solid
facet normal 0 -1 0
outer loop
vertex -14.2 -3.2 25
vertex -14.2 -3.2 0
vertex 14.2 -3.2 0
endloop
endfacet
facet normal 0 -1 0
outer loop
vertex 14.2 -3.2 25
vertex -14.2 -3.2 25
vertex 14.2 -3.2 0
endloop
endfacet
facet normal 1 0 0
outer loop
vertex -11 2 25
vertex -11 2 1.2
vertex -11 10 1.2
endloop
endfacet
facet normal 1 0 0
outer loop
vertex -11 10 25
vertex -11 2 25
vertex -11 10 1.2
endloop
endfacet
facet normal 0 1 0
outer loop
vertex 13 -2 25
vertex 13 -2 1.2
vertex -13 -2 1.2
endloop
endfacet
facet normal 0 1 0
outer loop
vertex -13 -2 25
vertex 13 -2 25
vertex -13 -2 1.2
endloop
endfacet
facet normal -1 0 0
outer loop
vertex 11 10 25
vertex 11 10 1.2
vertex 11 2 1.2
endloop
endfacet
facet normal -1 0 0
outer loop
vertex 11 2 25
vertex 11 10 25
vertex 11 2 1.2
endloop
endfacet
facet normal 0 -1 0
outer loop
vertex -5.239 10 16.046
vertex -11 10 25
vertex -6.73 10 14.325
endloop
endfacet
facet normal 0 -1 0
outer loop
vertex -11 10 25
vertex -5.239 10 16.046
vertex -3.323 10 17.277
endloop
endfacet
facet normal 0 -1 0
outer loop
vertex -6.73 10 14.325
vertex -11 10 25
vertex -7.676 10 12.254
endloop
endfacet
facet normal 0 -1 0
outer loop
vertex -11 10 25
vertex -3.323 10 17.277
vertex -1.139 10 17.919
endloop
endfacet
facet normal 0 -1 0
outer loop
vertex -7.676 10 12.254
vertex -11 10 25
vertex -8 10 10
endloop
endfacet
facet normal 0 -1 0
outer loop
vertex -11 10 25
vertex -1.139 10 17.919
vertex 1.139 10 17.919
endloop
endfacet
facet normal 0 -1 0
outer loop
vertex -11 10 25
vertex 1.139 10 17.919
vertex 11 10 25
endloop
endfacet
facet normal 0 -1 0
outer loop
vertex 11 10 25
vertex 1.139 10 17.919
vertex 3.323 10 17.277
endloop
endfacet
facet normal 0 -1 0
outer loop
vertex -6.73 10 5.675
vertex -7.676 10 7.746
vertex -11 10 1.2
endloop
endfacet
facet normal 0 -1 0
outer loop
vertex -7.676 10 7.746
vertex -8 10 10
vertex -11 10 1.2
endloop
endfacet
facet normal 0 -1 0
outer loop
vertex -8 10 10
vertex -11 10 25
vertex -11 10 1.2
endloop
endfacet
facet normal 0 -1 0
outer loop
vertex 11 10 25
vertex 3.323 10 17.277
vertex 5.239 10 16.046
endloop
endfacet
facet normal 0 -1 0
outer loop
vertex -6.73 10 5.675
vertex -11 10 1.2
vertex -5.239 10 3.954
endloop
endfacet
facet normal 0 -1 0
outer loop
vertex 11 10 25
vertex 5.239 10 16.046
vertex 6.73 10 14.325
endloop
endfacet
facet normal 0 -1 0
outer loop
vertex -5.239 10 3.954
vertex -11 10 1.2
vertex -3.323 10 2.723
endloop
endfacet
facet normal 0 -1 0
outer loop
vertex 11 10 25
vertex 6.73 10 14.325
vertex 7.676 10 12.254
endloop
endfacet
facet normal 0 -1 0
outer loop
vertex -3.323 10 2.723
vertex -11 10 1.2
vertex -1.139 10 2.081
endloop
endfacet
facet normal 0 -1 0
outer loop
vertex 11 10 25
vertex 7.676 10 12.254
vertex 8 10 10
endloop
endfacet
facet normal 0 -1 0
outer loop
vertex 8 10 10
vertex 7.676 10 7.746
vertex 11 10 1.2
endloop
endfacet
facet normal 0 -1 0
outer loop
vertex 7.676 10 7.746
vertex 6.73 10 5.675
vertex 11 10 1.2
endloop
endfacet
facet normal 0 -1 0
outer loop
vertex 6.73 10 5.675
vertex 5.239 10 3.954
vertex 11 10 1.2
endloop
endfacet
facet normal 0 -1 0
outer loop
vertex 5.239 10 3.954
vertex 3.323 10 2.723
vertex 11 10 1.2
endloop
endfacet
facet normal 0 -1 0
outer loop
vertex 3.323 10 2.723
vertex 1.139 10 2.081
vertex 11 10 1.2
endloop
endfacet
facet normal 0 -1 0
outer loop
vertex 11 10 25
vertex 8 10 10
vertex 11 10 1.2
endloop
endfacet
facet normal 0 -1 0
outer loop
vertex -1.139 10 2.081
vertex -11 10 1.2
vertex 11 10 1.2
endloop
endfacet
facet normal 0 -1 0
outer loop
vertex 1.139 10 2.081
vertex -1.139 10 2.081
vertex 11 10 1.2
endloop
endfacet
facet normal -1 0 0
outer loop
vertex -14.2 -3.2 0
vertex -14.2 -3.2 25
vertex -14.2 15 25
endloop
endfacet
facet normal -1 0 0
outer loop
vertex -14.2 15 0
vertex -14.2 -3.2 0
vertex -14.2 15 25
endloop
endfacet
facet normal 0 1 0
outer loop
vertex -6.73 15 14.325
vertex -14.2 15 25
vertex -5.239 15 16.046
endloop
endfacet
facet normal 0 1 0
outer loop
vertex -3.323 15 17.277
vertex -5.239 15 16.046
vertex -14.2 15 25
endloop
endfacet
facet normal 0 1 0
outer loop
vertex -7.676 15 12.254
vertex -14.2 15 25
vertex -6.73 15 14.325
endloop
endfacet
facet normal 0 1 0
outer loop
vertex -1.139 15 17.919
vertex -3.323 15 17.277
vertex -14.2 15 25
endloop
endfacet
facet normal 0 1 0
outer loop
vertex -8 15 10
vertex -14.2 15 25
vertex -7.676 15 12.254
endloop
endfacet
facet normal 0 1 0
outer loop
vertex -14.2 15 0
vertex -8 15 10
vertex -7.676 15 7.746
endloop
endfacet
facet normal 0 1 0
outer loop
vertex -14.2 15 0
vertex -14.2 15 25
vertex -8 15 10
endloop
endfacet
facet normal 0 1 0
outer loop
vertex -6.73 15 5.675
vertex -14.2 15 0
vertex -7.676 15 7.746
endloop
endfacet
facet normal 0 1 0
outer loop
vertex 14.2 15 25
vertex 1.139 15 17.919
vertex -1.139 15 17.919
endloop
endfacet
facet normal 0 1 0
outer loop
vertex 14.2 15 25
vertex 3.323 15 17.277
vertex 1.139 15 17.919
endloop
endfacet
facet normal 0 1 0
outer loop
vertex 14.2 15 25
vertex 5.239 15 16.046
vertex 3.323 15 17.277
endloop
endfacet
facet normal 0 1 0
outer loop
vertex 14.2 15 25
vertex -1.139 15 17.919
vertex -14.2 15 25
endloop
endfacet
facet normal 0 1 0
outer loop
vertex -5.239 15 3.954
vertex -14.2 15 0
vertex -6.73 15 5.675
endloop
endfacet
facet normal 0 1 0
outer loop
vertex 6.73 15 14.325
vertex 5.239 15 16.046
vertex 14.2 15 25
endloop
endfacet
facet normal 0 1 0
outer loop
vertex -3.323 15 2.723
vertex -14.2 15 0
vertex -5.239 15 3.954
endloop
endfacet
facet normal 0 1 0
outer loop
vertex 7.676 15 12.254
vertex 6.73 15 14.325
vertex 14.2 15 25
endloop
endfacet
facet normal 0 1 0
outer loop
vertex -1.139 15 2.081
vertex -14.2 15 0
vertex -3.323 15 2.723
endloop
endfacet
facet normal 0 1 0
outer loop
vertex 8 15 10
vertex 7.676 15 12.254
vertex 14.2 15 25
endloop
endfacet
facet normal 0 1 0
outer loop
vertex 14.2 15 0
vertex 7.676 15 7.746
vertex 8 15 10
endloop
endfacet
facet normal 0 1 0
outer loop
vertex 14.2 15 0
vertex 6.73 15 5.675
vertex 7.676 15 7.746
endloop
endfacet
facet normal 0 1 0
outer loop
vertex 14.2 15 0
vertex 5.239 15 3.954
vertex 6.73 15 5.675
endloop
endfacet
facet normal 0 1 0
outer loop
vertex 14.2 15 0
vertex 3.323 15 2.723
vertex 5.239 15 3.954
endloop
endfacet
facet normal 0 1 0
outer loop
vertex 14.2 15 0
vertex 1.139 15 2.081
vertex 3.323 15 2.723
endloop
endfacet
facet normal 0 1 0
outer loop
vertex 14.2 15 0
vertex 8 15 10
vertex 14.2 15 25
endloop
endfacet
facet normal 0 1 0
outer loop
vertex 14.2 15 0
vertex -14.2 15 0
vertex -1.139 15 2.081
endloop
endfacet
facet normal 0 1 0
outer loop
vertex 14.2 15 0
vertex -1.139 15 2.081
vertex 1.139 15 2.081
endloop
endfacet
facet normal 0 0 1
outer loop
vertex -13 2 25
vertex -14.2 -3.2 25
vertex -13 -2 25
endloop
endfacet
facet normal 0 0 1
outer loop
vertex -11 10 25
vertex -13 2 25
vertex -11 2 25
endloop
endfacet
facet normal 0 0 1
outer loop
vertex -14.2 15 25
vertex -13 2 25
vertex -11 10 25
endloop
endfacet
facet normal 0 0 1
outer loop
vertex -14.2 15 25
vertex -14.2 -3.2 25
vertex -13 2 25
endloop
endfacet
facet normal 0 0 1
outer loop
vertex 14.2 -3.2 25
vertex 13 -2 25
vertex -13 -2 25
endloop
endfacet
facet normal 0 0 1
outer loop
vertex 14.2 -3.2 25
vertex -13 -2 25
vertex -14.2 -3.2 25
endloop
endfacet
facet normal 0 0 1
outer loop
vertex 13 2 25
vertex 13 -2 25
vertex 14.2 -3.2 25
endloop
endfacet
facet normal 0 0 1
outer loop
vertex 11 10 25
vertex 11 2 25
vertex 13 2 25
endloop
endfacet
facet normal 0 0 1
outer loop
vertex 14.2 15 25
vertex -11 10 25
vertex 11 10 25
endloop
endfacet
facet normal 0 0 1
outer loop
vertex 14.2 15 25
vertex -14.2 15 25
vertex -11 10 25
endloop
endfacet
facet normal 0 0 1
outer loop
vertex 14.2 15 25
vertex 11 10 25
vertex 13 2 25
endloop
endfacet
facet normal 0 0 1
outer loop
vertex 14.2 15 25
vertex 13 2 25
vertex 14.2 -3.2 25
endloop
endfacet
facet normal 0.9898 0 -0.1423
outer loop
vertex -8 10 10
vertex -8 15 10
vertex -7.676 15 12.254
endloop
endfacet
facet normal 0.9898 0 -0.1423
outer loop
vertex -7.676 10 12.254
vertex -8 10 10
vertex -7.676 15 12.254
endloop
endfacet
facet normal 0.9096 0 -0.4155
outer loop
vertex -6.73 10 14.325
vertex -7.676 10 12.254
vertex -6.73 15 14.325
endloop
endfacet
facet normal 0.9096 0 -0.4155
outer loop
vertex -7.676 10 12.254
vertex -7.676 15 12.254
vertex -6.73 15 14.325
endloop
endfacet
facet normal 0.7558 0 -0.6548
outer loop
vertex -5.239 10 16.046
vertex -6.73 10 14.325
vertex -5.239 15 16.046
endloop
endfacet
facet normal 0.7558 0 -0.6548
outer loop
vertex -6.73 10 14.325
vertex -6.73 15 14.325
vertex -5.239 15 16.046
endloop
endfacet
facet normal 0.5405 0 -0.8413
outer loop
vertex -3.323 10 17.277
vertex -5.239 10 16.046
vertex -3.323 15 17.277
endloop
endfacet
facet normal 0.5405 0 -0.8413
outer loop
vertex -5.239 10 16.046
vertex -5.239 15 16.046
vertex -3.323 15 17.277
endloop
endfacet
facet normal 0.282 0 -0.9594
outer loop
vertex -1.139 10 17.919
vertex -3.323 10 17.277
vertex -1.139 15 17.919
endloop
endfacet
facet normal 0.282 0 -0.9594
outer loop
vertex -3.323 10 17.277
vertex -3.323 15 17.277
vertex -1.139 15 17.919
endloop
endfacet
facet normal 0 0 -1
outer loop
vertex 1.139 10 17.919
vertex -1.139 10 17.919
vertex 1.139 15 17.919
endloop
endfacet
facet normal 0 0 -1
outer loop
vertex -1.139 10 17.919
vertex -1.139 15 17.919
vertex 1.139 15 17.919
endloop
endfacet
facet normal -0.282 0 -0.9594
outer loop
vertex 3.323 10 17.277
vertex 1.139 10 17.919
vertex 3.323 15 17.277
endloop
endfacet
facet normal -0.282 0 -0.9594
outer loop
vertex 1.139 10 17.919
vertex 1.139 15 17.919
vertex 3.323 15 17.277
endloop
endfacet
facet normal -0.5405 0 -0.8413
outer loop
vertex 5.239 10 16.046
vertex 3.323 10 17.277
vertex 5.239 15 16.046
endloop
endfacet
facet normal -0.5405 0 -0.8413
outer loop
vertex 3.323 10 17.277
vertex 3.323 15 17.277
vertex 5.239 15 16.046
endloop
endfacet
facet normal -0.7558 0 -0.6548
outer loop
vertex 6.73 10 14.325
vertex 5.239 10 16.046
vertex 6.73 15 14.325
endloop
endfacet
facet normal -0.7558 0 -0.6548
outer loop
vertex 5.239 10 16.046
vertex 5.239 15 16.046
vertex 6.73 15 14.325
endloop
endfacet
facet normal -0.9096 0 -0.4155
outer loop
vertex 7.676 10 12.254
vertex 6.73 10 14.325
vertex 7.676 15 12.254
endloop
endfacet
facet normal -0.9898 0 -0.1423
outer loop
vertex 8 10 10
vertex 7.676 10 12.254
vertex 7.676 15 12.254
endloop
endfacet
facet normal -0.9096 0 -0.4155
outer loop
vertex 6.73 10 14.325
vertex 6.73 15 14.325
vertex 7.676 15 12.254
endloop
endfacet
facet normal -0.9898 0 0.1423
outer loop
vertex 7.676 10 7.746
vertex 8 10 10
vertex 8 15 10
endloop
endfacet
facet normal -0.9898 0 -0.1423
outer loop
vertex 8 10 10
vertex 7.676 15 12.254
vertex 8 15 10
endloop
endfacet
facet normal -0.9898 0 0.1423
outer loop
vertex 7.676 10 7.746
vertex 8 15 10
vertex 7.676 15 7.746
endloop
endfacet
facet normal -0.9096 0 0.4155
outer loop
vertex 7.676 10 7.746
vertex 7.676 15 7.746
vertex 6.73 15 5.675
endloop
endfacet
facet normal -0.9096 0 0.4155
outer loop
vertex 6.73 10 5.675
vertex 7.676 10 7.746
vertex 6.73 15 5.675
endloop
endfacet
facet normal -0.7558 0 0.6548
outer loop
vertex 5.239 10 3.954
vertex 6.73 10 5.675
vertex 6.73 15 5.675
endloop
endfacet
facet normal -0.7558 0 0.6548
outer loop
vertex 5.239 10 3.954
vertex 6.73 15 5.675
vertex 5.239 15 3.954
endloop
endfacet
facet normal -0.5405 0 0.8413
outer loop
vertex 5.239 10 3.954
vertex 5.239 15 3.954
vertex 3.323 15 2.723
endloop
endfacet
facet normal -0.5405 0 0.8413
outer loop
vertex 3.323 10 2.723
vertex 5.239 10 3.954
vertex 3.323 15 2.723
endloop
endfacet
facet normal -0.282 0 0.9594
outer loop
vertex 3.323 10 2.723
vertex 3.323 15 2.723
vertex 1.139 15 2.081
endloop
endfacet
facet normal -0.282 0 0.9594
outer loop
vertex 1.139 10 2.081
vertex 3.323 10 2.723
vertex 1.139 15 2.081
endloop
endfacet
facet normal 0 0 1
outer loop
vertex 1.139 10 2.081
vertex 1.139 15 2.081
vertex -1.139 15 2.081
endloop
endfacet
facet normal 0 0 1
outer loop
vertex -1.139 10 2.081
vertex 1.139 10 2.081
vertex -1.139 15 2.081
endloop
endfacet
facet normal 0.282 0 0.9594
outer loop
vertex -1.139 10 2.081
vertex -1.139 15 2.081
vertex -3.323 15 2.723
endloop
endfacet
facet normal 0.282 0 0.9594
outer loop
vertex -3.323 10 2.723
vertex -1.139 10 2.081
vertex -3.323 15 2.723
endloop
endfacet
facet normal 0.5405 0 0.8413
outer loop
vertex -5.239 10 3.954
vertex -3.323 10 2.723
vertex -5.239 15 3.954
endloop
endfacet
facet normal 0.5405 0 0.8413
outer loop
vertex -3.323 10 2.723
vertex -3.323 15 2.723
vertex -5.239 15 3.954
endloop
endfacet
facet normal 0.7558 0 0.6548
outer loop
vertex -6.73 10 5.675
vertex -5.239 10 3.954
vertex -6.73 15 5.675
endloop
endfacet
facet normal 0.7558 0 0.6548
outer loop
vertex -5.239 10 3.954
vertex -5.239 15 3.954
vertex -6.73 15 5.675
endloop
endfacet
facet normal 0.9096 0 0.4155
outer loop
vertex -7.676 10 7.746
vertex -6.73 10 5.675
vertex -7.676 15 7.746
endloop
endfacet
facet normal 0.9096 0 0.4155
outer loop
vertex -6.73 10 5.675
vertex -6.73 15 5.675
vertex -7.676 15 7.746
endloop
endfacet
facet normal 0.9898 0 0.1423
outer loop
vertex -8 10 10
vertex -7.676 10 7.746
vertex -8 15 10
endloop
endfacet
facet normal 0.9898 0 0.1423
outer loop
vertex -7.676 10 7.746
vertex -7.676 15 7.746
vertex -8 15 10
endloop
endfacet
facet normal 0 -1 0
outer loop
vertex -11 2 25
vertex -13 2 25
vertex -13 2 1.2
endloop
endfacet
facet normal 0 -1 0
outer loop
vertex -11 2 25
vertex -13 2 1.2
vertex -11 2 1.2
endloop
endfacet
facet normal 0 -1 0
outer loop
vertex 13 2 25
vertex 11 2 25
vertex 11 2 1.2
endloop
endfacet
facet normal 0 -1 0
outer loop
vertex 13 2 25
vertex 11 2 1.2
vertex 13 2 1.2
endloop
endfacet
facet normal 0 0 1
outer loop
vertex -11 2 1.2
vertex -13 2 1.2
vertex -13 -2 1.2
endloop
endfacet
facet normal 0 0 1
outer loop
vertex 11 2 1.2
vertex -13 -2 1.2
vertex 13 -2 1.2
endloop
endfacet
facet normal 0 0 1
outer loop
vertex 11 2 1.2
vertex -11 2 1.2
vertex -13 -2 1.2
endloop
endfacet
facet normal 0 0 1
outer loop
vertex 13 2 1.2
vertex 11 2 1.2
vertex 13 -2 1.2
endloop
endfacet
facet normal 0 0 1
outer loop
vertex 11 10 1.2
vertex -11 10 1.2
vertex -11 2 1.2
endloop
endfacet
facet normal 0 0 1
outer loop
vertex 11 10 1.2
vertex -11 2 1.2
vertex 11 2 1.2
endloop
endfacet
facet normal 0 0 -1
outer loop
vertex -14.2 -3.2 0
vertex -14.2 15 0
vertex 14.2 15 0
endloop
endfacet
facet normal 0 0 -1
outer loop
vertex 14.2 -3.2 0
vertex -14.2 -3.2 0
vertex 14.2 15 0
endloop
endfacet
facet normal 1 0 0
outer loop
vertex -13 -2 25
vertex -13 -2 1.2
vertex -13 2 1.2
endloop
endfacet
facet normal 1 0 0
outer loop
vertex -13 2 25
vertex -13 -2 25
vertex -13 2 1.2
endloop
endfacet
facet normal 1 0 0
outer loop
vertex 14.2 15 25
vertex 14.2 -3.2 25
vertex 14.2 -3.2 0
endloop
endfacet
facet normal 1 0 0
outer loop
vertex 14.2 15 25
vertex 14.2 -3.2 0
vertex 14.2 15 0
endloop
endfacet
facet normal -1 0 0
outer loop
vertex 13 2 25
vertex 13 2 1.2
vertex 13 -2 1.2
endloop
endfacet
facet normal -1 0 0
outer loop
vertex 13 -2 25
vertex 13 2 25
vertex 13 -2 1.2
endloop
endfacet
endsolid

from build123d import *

# Parameters (mm, degrees)
F0_W     = 28.4
F0_H     = 18.2
F1_DEPTH = 25
F0_W_2   = 22
F0_H_2   = 8
F2_DEPTH = 1.2
F3_R     = 8
F4_DEPTH = 5


with BuildPart() as f1:
    # F0 (on Top) → F1 (new body)
    with BuildSketch(Plane.XY):
        with Locations((0, 5.9)):
            Rectangle(F0_W, F0_H)
        Polygon((11, 2), (13, 2), (13, -2), (-13, -2), (-13, 2), (-11, 2), (-11, 10), (11, 10), align=None, mode=Mode.SUBTRACT)
    extrude(amount=F1_DEPTH)

    # F0 (on Top) → F2 (join)
    with BuildSketch(Plane.XY):
        with Locations((0, 6)):
            Rectangle(F0_W_2, F0_H_2)
        Polygon((13, -2), (13, 2), (11, 2), (-11, 2), (-13, 2), (-13, -2), align=None)
    extrude(amount=F2_DEPTH)

    # F3 (on face) → F4 (cut)
    with BuildSketch(Plane(origin=(0, 15, 0), x_dir=(-1, 0, 0), z_dir=(0, 1, 0))):
        with Locations((0, 10)):
            Circle(F3_R)
    extrude(amount=-F4_DEPTH, mode=Mode.SUBTRACT)


solid = f1.part
